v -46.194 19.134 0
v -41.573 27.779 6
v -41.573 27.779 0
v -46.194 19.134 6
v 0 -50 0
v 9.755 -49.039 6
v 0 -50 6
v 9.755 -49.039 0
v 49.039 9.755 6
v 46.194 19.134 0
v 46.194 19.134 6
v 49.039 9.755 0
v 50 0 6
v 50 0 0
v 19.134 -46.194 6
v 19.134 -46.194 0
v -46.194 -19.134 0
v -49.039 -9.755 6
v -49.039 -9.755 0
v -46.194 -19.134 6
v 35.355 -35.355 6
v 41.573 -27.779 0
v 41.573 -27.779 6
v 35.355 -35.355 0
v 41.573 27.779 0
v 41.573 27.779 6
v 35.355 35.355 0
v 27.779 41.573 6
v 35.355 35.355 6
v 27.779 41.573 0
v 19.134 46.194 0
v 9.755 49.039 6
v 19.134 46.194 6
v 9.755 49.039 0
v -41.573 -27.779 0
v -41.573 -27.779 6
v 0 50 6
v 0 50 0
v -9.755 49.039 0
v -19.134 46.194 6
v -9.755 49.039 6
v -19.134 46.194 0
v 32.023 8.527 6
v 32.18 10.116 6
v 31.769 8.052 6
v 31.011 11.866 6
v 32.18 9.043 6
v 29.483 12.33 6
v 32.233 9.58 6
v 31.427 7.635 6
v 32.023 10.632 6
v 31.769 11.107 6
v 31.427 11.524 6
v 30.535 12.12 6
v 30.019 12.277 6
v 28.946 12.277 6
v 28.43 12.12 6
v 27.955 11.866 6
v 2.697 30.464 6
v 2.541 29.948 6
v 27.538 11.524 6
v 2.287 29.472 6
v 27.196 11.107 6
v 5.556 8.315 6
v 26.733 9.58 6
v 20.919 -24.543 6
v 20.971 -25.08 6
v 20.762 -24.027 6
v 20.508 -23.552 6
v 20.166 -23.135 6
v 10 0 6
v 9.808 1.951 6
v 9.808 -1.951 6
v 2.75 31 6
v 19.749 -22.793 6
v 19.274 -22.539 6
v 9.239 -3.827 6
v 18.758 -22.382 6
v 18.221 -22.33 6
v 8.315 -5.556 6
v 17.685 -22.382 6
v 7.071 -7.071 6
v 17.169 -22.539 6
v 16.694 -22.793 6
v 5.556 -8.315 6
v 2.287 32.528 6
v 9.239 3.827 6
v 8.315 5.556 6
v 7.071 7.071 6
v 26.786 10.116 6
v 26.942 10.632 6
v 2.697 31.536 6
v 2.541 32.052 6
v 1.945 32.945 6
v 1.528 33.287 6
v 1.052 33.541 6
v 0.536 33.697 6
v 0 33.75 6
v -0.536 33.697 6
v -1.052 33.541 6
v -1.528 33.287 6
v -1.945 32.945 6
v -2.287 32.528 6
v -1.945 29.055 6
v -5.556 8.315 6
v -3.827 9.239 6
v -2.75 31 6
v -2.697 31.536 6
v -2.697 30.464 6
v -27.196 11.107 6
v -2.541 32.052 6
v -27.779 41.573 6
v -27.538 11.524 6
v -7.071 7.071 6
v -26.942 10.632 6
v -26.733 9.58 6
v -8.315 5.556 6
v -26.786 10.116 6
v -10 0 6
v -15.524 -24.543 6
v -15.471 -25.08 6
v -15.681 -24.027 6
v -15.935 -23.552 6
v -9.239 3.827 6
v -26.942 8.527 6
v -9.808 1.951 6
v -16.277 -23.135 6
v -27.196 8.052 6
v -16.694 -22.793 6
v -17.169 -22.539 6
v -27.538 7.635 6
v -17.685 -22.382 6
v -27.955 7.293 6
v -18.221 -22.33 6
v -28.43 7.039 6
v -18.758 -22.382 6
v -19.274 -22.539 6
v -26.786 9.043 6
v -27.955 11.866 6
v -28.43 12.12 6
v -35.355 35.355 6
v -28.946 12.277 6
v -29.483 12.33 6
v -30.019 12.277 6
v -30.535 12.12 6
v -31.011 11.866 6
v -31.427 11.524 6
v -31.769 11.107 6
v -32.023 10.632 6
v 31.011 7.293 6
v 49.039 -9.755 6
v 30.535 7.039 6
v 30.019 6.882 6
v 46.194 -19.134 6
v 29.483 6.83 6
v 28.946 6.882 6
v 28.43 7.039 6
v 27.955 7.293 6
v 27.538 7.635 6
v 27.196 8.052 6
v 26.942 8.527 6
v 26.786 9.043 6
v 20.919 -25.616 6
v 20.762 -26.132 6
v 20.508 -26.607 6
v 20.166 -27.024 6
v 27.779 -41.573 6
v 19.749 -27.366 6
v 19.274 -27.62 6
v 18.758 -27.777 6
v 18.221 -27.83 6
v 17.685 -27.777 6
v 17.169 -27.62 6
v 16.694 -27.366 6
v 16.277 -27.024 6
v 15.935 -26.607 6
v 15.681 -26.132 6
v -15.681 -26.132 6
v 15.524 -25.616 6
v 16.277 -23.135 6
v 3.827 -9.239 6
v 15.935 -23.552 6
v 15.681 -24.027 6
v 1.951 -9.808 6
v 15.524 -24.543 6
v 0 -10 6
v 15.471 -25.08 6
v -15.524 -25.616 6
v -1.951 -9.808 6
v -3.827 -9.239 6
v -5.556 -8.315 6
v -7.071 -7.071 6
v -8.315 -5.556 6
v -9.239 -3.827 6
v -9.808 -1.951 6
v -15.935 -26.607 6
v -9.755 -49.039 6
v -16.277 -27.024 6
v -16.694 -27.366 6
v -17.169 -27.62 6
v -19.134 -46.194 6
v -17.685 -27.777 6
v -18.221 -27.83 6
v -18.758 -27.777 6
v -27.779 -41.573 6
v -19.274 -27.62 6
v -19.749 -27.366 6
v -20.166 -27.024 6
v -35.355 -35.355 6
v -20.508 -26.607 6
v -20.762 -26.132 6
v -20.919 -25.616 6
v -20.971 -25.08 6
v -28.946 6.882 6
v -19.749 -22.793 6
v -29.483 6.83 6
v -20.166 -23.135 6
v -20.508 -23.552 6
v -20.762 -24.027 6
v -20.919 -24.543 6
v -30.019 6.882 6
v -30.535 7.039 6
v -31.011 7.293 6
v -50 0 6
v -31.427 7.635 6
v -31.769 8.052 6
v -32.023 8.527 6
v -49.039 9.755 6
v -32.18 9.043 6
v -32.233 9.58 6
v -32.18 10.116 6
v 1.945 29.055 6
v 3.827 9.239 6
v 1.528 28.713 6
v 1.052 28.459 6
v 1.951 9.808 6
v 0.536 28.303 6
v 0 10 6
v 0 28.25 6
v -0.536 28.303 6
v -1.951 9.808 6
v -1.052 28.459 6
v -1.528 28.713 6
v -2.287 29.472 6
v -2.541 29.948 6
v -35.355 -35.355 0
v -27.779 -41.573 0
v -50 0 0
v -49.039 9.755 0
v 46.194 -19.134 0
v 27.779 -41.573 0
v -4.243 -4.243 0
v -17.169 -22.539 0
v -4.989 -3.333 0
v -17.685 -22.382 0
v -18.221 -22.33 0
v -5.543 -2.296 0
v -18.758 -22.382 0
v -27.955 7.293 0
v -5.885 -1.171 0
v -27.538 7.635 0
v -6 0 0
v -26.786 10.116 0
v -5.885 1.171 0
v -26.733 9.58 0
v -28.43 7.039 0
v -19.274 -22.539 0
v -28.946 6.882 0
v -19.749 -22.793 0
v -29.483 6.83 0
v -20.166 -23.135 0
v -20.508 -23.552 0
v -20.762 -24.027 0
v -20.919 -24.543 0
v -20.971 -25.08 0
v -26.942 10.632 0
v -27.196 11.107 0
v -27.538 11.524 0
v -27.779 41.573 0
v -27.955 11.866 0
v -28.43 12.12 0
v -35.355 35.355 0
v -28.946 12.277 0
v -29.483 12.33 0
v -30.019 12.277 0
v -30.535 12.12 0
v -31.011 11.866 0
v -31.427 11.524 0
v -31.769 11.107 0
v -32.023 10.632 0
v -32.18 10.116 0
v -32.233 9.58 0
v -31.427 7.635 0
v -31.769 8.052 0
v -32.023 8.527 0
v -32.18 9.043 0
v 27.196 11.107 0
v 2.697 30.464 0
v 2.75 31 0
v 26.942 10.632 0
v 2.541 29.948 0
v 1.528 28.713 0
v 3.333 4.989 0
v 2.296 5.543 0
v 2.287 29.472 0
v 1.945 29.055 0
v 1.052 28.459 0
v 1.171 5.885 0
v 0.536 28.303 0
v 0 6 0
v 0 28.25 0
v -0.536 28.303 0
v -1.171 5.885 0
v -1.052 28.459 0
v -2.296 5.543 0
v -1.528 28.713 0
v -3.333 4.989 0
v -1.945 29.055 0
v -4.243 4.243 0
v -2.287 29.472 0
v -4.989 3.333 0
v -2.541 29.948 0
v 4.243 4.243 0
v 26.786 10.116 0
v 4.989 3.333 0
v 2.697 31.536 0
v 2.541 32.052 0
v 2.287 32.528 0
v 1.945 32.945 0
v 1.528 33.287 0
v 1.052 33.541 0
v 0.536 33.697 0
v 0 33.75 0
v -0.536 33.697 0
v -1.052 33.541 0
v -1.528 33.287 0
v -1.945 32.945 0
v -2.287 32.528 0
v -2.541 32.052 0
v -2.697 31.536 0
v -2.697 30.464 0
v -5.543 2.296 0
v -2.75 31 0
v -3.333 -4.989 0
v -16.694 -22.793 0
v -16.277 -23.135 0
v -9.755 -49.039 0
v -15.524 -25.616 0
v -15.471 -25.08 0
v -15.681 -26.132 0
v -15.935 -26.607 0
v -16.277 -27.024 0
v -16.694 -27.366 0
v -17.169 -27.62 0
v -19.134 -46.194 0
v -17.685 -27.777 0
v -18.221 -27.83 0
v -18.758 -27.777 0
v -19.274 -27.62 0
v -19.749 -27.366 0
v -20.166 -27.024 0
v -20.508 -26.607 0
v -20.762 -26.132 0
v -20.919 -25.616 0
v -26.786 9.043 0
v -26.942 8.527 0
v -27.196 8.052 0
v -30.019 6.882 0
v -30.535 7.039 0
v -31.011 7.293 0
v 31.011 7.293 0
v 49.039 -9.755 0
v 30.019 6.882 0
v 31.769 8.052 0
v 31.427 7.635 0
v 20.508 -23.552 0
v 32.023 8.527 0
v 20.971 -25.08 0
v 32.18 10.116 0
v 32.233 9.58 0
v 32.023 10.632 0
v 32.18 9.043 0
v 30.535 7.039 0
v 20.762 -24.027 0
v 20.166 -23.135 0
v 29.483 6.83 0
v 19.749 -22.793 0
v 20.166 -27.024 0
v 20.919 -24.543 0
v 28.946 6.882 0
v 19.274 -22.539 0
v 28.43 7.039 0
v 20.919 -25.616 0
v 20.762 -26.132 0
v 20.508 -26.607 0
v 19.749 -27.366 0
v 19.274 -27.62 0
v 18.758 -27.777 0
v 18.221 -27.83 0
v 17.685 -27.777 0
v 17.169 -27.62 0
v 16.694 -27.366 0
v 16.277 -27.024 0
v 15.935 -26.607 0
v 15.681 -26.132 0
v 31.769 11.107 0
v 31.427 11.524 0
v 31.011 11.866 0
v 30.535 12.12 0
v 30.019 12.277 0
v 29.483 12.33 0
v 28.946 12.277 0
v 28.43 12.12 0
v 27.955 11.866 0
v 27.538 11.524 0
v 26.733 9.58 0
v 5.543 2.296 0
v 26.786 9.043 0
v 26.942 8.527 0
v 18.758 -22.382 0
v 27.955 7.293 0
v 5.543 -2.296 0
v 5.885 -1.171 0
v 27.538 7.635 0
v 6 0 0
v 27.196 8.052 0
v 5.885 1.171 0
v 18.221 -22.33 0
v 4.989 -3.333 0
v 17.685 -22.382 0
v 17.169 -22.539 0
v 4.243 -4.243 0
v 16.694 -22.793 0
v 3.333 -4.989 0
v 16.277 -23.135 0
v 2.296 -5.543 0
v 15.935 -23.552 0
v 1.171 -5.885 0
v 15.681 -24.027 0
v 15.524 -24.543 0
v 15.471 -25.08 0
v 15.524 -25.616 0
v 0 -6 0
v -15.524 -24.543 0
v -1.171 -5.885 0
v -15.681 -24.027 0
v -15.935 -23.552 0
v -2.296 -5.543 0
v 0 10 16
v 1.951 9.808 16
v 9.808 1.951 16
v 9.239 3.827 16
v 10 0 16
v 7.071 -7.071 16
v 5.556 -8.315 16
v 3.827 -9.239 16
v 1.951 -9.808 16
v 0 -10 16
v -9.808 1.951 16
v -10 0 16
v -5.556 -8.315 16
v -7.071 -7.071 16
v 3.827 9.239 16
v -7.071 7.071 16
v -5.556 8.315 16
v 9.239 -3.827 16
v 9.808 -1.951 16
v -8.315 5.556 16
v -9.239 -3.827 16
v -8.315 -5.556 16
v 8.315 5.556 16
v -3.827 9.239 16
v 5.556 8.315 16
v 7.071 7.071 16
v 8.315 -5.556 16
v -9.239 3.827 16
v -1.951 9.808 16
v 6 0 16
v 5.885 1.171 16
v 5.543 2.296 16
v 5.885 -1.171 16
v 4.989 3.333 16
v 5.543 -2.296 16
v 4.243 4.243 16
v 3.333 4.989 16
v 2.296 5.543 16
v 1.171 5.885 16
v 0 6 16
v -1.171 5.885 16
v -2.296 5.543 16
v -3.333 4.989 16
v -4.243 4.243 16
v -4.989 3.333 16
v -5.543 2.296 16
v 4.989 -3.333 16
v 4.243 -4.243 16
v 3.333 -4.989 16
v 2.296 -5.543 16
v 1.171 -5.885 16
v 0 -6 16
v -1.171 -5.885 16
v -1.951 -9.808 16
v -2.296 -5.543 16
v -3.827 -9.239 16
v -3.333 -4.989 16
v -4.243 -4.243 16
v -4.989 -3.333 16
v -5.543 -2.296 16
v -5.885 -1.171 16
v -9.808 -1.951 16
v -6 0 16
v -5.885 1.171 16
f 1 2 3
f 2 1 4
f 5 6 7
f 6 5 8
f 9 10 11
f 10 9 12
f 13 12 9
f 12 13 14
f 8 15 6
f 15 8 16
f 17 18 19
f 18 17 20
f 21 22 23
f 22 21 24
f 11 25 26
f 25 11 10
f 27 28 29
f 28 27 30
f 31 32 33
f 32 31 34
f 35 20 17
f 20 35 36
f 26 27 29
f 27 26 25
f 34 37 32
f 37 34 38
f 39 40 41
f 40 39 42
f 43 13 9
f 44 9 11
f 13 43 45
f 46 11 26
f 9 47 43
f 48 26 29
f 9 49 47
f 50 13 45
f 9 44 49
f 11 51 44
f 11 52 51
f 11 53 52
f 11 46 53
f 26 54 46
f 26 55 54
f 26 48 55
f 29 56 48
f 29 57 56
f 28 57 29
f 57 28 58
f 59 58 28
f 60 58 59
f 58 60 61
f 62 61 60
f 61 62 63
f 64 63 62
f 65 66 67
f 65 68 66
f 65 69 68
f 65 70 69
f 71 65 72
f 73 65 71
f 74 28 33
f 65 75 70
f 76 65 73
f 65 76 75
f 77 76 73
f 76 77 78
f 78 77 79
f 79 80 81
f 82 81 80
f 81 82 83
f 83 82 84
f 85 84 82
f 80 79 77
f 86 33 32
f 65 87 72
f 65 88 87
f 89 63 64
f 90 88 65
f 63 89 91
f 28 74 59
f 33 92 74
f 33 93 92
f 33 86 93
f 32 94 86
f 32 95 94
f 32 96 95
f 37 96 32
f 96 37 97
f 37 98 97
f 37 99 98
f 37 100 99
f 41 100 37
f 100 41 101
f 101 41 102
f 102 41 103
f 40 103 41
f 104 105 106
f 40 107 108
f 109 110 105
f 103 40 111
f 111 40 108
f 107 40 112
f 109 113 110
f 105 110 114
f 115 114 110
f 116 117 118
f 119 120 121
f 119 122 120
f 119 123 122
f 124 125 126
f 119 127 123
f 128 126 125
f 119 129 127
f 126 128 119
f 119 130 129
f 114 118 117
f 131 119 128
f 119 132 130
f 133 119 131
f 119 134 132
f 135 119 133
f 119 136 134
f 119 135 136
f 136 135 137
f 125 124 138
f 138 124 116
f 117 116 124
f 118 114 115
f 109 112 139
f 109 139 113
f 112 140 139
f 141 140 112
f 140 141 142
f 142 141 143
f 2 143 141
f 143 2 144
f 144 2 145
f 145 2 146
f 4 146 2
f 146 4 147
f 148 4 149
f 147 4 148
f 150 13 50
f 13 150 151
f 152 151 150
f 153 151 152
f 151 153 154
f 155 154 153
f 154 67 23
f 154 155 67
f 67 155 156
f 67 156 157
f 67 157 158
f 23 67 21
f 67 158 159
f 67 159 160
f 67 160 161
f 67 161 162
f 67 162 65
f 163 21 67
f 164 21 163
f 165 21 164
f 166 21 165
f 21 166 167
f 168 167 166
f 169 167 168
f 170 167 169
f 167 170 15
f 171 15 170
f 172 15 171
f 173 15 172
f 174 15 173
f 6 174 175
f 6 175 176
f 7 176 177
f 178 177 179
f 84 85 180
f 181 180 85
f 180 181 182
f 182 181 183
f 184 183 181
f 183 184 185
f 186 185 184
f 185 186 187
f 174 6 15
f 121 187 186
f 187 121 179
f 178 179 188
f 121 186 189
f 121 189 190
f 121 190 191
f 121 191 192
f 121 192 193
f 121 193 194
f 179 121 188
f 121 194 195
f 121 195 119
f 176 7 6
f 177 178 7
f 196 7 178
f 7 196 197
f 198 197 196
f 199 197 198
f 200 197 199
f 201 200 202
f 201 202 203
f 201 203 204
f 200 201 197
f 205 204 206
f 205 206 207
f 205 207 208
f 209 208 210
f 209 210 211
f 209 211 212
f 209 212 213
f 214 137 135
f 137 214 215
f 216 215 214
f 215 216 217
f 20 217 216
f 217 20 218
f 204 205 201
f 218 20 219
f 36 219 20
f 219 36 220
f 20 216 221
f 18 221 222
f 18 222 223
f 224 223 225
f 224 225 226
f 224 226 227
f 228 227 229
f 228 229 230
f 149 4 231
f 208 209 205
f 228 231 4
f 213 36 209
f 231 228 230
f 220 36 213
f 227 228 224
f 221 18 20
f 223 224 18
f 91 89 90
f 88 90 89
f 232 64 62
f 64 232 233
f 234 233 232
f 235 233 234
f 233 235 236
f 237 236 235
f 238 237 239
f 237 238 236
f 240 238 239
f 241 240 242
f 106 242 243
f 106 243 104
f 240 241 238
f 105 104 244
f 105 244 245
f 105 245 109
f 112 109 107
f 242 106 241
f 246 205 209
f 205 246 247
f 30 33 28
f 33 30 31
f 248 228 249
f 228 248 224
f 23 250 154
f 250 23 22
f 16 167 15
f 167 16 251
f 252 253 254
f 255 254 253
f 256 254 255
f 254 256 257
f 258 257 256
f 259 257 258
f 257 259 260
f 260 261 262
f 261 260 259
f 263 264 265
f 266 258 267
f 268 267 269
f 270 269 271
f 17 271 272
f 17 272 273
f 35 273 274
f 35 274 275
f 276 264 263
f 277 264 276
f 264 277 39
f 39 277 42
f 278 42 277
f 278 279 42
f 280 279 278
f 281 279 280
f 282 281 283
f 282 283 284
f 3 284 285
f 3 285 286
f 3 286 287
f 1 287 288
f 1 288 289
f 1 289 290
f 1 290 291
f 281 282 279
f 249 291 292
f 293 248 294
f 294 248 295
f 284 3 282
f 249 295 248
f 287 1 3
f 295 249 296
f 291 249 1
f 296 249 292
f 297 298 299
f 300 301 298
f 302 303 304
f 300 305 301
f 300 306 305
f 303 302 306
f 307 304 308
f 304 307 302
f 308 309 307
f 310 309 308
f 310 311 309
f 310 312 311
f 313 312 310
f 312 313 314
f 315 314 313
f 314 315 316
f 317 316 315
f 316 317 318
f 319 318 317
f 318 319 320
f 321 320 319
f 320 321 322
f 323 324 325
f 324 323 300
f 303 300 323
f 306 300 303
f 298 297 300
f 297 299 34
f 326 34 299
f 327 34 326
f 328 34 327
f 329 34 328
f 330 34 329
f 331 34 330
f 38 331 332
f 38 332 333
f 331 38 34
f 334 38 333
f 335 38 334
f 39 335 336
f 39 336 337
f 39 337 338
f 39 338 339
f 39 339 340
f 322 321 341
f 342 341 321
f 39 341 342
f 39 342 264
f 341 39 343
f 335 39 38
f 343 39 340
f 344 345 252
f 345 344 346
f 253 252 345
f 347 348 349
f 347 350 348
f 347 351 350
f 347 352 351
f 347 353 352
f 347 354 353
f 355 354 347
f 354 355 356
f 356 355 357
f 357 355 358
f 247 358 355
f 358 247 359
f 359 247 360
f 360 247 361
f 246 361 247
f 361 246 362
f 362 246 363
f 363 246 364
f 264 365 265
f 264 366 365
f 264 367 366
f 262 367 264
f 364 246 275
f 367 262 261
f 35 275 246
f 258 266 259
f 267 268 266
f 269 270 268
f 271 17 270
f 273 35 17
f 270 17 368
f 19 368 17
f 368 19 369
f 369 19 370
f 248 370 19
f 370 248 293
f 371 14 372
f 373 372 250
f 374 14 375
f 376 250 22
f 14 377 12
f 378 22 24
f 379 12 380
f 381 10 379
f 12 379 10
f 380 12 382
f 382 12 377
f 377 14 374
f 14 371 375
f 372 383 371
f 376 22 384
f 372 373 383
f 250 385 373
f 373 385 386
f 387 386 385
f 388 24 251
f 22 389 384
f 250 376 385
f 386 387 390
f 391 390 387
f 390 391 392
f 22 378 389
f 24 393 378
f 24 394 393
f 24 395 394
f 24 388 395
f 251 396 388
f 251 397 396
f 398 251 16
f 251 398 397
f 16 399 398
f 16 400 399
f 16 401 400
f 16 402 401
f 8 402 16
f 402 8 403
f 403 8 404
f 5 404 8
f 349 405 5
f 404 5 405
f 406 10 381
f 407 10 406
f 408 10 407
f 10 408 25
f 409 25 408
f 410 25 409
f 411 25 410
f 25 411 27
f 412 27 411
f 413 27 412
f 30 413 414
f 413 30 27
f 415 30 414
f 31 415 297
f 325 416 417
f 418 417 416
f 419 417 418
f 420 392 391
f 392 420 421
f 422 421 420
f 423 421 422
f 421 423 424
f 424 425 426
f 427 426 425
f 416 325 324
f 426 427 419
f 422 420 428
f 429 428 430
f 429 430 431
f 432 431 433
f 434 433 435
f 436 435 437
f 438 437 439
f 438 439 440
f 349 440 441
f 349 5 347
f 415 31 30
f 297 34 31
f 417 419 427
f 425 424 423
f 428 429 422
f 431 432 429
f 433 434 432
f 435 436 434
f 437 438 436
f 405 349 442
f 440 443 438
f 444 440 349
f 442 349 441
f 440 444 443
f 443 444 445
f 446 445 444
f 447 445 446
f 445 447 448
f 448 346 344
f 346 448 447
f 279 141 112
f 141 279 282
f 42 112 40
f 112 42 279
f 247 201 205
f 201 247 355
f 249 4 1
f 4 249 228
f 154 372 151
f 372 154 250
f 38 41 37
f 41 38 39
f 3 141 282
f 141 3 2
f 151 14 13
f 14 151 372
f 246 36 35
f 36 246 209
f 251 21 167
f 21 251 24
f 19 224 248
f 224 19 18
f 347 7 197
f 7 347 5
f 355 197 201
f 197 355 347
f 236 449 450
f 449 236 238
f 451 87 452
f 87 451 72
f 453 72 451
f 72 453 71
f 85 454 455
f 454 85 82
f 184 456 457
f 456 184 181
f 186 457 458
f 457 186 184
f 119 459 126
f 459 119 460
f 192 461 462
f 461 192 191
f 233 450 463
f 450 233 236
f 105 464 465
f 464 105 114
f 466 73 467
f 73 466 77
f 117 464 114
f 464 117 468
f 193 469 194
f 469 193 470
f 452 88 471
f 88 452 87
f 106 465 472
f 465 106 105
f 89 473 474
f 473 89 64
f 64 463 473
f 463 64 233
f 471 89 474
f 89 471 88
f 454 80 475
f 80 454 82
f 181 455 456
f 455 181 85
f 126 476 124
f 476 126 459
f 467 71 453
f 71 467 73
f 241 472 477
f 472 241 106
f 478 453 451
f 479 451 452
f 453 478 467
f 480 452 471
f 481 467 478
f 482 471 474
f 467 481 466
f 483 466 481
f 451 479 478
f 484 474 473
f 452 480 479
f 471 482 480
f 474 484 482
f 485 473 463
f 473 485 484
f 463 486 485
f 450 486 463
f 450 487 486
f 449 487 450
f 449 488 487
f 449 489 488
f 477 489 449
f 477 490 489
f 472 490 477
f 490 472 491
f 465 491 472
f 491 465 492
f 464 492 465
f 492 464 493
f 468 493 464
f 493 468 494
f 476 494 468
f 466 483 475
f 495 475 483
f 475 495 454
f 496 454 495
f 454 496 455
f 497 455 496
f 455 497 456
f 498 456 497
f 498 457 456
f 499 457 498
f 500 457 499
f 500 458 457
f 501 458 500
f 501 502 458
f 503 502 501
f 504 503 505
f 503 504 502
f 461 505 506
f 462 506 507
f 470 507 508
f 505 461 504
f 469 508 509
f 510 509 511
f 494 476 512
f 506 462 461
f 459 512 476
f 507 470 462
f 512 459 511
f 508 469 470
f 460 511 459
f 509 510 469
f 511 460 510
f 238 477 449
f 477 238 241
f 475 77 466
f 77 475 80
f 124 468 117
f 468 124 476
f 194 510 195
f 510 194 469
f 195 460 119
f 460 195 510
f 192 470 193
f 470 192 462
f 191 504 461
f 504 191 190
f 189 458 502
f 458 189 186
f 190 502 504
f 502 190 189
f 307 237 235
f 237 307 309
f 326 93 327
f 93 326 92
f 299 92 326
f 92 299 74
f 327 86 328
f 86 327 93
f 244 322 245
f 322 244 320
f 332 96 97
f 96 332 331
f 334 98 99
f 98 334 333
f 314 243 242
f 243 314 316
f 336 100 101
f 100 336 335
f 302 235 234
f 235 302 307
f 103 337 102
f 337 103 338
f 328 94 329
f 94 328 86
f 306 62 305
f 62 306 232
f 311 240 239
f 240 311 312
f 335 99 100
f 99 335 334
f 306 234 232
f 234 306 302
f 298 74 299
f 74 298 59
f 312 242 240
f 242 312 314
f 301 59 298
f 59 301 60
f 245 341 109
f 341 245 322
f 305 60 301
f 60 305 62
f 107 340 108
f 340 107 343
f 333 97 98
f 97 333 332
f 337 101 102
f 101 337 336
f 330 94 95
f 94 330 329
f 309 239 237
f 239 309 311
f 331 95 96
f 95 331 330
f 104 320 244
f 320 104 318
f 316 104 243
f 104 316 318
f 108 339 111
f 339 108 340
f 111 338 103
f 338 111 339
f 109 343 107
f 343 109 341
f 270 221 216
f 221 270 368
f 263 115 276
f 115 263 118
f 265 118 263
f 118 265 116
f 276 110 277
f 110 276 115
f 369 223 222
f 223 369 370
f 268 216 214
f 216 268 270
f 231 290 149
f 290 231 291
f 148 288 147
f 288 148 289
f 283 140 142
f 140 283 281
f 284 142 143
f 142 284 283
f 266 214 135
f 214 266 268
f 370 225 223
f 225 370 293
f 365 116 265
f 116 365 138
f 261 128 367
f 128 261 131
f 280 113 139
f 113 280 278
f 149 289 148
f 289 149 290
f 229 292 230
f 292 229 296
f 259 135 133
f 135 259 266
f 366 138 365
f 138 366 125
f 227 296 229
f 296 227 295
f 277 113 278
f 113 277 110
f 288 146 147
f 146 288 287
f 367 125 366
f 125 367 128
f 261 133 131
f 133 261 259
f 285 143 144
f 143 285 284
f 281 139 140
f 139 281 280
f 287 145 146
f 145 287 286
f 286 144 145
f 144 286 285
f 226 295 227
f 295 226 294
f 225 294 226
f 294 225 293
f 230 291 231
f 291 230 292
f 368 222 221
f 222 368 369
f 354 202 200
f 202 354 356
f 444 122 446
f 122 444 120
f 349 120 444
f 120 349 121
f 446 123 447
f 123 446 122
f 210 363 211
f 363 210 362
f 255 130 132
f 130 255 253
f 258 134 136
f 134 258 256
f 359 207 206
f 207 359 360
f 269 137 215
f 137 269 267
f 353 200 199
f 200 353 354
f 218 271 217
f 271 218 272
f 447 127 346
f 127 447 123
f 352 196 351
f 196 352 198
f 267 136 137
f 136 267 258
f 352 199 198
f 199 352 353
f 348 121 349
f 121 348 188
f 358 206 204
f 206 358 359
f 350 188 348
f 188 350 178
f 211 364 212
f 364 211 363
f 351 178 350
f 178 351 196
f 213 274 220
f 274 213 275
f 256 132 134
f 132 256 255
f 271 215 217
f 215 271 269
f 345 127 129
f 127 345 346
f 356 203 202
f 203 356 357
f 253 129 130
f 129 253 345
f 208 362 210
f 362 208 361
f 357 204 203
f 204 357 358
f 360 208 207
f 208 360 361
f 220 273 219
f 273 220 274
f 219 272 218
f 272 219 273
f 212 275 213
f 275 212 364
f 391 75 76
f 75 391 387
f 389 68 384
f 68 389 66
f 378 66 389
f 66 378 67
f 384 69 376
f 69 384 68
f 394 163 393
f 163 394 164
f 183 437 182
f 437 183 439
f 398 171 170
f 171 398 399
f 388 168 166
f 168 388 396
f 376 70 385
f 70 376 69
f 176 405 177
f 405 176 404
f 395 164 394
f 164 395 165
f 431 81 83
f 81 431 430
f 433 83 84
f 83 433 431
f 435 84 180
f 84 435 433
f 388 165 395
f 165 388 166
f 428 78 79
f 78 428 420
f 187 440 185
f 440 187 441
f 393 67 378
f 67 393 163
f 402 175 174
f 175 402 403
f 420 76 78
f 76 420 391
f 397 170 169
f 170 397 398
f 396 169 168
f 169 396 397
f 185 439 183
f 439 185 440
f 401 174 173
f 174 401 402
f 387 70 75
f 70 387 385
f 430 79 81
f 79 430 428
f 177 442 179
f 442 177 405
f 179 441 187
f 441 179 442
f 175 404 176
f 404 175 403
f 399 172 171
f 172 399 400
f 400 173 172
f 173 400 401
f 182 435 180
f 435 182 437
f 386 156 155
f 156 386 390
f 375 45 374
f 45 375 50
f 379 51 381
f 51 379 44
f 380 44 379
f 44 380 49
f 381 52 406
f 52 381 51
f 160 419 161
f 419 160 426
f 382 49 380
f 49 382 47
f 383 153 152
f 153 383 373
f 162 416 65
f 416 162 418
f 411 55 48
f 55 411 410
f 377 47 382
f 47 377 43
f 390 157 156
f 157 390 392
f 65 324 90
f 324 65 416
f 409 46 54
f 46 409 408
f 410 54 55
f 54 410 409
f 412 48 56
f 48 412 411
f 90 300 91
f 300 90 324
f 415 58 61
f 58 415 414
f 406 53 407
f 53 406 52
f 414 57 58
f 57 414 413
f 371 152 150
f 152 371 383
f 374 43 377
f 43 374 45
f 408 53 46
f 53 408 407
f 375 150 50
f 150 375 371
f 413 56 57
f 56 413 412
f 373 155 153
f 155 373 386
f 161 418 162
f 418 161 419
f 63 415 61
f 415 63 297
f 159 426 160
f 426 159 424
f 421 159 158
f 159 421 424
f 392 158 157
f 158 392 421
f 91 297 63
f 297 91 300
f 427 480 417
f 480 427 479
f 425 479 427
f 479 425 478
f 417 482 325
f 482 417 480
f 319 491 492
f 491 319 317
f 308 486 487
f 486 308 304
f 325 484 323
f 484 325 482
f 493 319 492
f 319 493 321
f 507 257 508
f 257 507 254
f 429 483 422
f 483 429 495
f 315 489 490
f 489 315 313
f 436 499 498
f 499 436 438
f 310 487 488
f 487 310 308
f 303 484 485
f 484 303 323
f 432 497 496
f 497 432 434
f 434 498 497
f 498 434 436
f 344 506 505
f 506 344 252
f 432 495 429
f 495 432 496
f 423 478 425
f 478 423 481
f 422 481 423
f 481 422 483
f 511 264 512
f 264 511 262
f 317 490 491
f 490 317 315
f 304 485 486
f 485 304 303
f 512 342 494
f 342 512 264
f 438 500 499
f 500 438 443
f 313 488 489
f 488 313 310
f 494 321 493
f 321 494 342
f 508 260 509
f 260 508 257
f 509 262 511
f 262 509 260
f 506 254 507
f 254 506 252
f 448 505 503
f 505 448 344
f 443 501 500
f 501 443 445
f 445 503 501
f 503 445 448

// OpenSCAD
$fn = 32;

// ----------------------------------------------------------------------
// Flange Ø100 x 6
// 5 holes on a Ø62 bolt circle, bolted joints
// ----------------------------------------------------------------------

// --- parameters (mm) ---
flange_d = 100;  // outside diameter of the flange
seat_tol = 0.1;  // tolerance at the seating features
free_tol = 0.5;  // general tolerance on the free sizes
thickness = 6;   // flange thickness
holes = 5;       // number of bolt holes
pcd = 62;        // bolt circle diameter
start_deg = 90;  // angle of the first hole, from +X
hole_d = 5.5;    // bolt hole diameter
bore_d = 12;     // central through bore
hub_d = 20;      // hub outside diameter
hub_h = 10;      // hub height above the flange face (0 = no hub)

// --- derived feature positions (mm) ---
height = thickness + hub_h;  // = 16   overall height of the part
pcd_r = pcd / 2;             // = 31   bolt circle radius
hole_step = 360 / holes;     // = 72   angular pitch
feature_centers = [
  [pcd_r * cos(start_deg + 0 * hole_step), pcd_r * sin(start_deg + 0 * hole_step)],
  [pcd_r * cos(start_deg + 1 * hole_step), pcd_r * sin(start_deg + 1 * hole_step)],
  [pcd_r * cos(start_deg + 2 * hole_step), pcd_r * sin(start_deg + 2 * hole_step)],
  [pcd_r * cos(start_deg + 3 * hole_step), pcd_r * sin(start_deg + 3 * hole_step)],
  [pcd_r * cos(start_deg + 4 * hole_step), pcd_r * sin(start_deg + 4 * hole_step)]
];   // bolt hole centres on the pitch circle

// flange disc, every hole and the bore cut straight through
difference() {
  union() {
    cylinder(d = flange_d, h = thickness);
    cylinder(d = hub_d, h = height);  // hub, overlapped into the flange
  }
  translate([0, 0, -1]) cylinder(d = bore_d, h = height + 2);  // bore, through
  for (centre = feature_centers)
    translate([centre[0], centre[1], -1]) cylinder(d = hole_d, h = thickness + 2);
}
